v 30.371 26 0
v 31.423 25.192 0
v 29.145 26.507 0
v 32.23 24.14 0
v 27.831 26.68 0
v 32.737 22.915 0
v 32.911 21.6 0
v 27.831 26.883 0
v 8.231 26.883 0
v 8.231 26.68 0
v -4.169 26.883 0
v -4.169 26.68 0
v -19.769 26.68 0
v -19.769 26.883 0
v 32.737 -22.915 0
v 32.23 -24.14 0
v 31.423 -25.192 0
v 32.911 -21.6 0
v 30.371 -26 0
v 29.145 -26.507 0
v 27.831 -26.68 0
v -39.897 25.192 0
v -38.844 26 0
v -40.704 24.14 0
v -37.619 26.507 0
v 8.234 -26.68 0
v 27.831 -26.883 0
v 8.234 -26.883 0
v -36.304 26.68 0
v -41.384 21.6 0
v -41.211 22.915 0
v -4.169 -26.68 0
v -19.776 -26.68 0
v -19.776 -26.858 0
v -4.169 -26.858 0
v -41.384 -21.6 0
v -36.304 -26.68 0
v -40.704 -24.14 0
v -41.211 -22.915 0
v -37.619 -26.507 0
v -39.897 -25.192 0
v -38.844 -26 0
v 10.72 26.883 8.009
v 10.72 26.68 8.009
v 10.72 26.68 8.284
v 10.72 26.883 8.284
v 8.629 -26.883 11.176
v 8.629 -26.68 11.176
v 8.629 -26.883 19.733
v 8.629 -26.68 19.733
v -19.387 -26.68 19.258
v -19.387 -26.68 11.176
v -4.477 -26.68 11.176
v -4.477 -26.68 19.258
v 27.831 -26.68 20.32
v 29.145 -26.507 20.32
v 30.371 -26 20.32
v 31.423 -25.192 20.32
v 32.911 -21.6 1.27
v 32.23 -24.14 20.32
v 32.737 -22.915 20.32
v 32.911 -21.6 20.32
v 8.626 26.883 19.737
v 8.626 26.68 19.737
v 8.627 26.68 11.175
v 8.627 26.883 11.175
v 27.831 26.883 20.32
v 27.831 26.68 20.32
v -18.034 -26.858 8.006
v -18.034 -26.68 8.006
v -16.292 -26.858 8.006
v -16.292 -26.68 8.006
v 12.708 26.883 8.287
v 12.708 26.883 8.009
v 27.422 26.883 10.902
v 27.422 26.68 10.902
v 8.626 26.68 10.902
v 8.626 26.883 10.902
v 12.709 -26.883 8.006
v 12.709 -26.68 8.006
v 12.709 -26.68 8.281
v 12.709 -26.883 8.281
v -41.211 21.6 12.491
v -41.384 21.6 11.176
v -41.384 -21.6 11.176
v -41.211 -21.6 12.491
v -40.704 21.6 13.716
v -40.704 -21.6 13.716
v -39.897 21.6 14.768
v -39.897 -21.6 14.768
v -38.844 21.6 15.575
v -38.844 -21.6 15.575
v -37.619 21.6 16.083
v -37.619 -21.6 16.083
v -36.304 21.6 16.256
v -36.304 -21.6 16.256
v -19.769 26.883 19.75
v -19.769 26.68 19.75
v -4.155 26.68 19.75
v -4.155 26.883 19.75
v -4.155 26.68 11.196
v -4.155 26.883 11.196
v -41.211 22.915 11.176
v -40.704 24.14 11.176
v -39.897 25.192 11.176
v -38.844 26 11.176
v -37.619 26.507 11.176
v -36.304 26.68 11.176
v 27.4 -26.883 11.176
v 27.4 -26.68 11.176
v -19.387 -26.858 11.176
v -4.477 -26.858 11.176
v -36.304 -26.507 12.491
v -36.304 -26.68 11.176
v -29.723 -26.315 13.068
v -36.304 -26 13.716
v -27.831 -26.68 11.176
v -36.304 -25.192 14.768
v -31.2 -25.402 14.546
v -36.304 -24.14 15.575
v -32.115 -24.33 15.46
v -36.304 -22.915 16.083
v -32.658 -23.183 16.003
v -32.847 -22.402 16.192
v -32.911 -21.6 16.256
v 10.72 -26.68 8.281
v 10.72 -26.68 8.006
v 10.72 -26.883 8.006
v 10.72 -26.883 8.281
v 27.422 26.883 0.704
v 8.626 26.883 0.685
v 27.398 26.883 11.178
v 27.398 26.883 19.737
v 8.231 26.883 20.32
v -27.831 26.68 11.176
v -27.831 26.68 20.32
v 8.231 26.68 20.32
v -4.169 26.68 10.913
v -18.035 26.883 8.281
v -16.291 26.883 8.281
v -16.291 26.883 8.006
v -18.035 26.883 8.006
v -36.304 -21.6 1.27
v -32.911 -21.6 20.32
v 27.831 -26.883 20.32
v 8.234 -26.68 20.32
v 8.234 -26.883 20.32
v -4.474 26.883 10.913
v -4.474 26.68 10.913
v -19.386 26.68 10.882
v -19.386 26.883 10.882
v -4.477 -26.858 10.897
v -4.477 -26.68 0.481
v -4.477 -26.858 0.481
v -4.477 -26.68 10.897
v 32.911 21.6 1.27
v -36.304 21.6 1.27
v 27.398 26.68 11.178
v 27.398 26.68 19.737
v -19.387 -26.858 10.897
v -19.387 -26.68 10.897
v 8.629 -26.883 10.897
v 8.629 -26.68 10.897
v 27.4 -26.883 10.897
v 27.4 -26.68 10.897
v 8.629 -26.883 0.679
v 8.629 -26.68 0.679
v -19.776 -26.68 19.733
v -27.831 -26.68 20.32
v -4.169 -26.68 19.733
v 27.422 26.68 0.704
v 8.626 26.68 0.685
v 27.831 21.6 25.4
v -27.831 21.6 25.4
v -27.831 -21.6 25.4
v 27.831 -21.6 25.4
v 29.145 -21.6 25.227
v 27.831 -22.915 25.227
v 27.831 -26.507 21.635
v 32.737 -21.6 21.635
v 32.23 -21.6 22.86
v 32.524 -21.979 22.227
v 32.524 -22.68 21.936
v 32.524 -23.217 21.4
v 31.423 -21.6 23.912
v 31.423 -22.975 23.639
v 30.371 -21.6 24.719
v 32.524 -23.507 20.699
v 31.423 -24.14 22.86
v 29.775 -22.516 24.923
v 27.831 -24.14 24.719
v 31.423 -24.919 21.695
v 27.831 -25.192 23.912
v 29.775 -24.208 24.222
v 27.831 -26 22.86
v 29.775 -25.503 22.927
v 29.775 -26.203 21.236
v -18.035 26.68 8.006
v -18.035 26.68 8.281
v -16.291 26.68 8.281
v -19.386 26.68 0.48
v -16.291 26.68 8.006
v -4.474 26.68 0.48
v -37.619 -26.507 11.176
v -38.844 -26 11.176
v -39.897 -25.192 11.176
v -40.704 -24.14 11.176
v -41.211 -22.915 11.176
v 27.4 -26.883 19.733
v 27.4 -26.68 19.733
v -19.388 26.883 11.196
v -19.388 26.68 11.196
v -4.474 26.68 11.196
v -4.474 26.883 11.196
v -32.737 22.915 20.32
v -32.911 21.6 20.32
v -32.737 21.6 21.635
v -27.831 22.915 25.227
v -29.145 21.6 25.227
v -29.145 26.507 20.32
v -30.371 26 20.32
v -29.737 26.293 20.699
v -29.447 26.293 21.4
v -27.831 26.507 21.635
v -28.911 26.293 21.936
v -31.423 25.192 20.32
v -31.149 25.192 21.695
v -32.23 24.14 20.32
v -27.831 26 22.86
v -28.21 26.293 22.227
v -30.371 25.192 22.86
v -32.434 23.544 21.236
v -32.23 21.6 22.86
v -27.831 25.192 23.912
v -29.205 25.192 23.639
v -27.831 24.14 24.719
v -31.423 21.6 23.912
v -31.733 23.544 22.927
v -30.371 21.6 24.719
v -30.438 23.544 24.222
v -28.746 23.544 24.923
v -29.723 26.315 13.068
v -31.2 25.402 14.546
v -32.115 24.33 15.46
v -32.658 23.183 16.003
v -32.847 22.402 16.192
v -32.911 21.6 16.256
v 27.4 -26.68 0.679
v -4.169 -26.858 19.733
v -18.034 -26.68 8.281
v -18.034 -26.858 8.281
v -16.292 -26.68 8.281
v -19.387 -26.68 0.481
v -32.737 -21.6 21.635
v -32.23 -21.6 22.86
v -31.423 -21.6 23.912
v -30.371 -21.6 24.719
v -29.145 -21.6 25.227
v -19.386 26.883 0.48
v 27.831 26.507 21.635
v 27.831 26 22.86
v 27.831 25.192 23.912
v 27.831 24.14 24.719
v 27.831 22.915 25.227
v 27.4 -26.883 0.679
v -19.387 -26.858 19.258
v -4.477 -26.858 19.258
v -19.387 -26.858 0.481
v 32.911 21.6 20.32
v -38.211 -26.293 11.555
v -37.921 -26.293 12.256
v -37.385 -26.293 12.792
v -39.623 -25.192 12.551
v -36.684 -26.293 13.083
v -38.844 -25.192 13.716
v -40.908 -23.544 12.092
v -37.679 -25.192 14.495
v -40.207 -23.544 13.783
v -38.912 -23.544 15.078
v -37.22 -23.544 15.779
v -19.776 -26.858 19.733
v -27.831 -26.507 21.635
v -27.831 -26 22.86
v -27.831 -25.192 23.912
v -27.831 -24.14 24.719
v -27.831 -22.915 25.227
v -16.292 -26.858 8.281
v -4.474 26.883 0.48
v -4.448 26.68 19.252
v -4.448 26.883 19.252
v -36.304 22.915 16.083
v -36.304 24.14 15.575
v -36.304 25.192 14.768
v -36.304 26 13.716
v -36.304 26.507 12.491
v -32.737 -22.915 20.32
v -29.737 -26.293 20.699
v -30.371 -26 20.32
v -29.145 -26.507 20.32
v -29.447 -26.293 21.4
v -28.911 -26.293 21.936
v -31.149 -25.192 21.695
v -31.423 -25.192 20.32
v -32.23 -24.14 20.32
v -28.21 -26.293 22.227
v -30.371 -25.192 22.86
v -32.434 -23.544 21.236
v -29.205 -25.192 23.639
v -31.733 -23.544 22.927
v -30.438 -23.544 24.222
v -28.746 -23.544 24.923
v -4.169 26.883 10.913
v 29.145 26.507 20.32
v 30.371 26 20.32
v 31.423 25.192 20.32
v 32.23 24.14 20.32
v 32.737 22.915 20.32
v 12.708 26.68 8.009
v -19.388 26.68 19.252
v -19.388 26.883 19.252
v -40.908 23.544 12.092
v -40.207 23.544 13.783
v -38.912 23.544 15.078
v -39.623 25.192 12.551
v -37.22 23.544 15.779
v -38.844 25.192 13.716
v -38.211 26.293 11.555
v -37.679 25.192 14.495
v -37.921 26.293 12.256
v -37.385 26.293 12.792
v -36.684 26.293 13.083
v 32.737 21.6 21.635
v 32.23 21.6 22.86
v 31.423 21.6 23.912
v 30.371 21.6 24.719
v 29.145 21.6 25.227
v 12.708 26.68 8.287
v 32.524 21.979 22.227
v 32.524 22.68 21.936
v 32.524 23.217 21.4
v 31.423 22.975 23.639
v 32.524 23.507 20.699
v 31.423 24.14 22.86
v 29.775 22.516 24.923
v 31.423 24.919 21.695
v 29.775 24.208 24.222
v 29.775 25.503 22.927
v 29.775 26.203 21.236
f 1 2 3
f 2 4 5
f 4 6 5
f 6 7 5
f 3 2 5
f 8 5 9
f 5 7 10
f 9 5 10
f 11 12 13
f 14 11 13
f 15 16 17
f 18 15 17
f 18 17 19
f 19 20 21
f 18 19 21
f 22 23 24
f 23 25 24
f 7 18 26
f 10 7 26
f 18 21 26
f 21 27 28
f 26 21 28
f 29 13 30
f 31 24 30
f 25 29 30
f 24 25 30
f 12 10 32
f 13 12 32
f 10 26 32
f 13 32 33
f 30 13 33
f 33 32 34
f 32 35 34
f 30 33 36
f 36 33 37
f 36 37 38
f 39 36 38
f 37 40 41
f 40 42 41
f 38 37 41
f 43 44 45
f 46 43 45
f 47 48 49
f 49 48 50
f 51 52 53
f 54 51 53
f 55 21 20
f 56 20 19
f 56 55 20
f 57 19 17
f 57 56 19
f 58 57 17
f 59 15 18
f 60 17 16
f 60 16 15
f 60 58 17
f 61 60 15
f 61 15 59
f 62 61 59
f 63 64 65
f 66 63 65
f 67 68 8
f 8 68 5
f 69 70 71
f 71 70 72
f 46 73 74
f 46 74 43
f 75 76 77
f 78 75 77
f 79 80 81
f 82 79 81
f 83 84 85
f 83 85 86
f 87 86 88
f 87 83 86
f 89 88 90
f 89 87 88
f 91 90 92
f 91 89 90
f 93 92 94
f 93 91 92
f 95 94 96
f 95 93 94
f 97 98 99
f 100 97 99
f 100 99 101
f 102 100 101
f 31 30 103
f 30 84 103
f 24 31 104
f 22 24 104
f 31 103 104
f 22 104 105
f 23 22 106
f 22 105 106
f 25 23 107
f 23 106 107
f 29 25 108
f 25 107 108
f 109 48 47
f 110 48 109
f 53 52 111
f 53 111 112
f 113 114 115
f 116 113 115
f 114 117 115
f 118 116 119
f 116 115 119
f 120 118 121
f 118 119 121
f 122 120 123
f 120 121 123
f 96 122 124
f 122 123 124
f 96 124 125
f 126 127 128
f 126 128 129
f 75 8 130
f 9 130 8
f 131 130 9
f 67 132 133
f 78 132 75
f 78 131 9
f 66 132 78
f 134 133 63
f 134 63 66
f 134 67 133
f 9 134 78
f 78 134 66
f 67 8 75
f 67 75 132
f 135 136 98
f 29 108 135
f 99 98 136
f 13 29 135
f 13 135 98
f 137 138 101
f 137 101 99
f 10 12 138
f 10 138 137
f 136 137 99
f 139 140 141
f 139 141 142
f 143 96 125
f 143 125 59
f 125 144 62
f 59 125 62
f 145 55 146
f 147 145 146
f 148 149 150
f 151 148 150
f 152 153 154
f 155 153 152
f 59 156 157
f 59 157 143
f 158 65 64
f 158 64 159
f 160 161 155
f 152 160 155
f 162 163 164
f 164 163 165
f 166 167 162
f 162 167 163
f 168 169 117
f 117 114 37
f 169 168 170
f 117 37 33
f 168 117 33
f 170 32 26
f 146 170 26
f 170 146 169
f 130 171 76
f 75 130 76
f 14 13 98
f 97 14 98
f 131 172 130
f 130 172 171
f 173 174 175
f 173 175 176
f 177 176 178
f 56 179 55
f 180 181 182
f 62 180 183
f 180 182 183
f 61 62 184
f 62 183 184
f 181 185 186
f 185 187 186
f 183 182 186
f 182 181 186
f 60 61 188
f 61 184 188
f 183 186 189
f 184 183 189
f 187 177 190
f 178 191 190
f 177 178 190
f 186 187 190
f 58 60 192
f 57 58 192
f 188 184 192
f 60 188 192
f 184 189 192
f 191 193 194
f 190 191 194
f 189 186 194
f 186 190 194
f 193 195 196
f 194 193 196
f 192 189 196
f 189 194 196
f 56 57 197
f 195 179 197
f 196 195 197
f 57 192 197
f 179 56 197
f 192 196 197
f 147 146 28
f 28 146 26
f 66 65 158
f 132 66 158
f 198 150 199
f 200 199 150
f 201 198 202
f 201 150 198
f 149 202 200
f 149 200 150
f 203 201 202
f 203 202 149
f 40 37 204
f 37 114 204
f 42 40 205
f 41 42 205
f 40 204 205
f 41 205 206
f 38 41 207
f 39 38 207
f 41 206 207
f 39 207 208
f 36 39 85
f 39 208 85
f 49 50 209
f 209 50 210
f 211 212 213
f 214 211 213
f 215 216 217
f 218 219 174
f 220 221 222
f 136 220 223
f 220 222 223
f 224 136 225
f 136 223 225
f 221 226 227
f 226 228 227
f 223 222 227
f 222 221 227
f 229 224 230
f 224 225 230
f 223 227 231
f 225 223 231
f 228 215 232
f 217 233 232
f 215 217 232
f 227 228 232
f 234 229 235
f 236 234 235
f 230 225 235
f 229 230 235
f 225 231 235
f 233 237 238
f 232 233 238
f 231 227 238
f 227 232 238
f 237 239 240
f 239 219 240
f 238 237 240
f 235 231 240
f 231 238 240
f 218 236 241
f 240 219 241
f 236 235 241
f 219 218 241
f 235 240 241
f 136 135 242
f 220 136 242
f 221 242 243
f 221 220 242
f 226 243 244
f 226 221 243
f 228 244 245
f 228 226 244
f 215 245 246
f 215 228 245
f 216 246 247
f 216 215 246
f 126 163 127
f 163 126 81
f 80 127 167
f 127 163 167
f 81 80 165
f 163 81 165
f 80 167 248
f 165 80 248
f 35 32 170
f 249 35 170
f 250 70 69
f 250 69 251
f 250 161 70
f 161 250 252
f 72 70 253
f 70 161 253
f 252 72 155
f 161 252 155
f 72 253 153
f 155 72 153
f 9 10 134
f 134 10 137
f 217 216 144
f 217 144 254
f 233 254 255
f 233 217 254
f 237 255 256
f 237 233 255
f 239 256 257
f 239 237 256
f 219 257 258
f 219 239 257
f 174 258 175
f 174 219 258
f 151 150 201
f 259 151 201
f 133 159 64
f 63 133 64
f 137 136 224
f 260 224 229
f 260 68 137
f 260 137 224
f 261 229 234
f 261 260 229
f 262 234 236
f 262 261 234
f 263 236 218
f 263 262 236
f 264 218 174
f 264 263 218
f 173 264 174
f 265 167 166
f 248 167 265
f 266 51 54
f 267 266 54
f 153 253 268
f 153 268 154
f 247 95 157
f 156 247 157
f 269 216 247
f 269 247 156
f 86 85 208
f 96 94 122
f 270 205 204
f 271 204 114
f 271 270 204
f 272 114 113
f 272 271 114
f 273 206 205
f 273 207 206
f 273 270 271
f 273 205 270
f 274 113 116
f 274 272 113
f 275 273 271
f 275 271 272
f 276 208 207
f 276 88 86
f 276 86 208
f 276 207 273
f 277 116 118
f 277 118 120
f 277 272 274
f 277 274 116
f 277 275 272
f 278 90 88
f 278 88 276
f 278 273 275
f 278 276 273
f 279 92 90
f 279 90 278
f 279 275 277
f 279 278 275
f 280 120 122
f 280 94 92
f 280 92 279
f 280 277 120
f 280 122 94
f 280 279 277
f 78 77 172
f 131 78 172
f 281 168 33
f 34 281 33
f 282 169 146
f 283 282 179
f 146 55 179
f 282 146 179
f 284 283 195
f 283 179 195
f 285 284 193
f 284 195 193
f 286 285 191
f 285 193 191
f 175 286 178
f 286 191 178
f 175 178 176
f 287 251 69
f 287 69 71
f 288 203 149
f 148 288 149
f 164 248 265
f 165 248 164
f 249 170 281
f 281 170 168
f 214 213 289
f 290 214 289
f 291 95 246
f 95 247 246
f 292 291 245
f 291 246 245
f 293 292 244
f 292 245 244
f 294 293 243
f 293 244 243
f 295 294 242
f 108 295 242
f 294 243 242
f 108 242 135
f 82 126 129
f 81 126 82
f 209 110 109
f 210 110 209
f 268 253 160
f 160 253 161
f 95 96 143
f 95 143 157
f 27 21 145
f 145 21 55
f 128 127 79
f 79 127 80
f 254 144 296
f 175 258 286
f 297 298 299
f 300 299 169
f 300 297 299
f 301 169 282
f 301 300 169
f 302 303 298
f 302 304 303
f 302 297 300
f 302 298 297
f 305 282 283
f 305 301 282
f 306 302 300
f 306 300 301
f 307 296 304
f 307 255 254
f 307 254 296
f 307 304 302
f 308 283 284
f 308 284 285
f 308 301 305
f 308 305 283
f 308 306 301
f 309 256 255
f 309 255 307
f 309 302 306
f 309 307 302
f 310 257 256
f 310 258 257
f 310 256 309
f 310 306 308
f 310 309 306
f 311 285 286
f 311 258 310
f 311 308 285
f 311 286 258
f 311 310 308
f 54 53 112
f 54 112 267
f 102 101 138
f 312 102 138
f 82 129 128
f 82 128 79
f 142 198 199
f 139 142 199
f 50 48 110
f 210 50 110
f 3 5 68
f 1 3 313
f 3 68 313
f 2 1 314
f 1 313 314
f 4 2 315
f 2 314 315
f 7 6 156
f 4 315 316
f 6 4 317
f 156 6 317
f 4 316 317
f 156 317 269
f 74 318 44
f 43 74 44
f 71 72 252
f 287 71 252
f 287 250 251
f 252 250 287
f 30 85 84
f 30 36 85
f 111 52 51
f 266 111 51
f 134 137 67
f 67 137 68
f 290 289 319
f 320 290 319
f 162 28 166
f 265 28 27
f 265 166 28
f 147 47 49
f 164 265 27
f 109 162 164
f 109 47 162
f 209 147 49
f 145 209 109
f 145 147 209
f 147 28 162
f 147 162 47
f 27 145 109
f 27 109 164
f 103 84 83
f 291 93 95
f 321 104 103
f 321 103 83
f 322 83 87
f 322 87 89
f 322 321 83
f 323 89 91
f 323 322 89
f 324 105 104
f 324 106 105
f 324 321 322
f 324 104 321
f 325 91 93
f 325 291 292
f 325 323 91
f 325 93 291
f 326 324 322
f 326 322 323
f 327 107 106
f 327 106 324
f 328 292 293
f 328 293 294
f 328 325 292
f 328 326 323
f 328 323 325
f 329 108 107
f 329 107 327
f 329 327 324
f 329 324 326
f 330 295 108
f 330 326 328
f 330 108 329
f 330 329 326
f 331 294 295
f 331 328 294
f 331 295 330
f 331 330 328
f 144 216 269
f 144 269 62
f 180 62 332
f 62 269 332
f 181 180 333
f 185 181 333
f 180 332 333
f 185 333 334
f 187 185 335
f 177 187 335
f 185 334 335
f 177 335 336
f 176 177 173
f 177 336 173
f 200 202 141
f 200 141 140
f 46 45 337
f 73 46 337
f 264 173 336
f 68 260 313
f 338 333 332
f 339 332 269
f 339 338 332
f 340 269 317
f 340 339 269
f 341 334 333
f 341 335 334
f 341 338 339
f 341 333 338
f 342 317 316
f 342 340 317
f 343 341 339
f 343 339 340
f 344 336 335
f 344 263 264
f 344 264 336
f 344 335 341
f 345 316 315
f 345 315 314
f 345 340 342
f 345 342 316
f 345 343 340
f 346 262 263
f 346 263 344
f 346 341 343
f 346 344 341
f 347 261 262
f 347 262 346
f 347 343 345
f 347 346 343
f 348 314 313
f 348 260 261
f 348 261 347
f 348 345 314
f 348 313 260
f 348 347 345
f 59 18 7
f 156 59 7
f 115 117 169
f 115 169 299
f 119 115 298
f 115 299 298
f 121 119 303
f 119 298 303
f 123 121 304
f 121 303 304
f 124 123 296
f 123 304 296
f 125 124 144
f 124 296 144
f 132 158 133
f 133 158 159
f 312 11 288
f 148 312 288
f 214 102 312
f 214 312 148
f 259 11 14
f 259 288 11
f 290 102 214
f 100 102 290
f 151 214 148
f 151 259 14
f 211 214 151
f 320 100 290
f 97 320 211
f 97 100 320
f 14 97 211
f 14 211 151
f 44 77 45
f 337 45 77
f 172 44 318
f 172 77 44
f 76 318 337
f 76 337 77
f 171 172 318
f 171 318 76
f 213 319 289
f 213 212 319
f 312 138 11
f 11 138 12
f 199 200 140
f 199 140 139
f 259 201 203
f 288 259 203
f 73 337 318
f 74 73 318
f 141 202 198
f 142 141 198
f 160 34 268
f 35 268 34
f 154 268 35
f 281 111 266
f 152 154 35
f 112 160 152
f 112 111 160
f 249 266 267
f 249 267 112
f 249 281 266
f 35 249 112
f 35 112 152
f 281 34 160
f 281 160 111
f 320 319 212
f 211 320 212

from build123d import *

# Parameters (mm, degrees)
F0_W      = 65.8210366964
F0_H      = 53.360377121
F1_DEPTH  = 25.4
F0_W_2    = 8.4739662707
F2_DEPTH  = 16.256
F3_R      = 5.08
F4_R      = 5.08
F6_W      = 14.9103230797
F6_H      = 10.4163230571
F6_H_2    = 8.0820930889
F6_W_2    = 1.7418600619
F6_H_3    = 0.2754591405
F8_DEPTH  = 0.1778
F6_W_3    = 18.7708195299
F6_H_4    = 10.2186049917
F6_H_5    = 8.557209163
F6_W_4    = 1.9885748625
F9_DEPTH  = 0.2032
F10_W     = 1.7440356314
F10_H     = 0.2743424848
F11_DEPTH = 0.2032
F7_W      = 43.200377121
F7_H      = 4.064
F12_DEPTH = 66.04
F13_DEPTH = 14.986


# Not quite as in the source:
# - two fillets or chamfers of one size are made in one step


with BuildPart() as f1:
    # F0 (on Top) → F1 (new body)
    with BuildSketch(Plane.XY):
        Rectangle(F0_W, F0_H)
    extrude(amount=F1_DEPTH)

    # F0 (on Top) → F2 (join)
    with BuildSketch(Plane.XY):
        with Locations((-37.1475014836, 0)):
            Rectangle(F0_W_2, F0_H)
    extrude(amount=F2_DEPTH)

    # F3
    f3_edges = [f1.edges().sort_by_distance(p)[0] for p in [
        (-32.910518, 0, 25.4),
        (-41.384485, 0, 16.256),
    ]]
    fillet(f3_edges, radius=F3_R)

    # F4
    f4_edges = [f1.edges().sort_by_distance(p)[0] for p in [
        (2.54, -26.680189, 25.4),
        (2.54, 26.680189, 25.4),
        (32.910518, 0, 25.4),
        (-39.896587, -26.680189, 14.768102),
        (-39.896587, 26.680189, 14.768102),
        (-32.910518, -26.680189, 18.288),
        (-32.910518, 26.680189, 18.288),
        (-31.422621, -26.680189, 23.912102),
        (-34.607501, -26.680189, 16.256),
        (32.910518, -26.680189, 12.7),
        (-41.384485, -26.680189, 5.588),
        (-31.422621, 26.680189, 23.912102),
        (-34.607501, 26.680189, 16.256),
        (32.910518, 26.680189, 12.7),
        (-41.384485, 26.680189, 5.588),
    ]]
    fillet(f4_edges, radius=F4_R)

    # F6 (on face) → F8 (join)
    with BuildSketch(Plane.XZ.offset(26.6801885605)):
        Polygon((-19.7755768895, 0), (-4.168510437, 0), (-4.168510437, 11.176), (-4.168510437, 19.733209163), (-19.7755768895, 19.733209163), (-19.7755768895, 11.176), align=None)
        with Locations((-11.9322177488, 5.6890027045)):
            Rectangle(F6_W, F6_H, mode=Mode.SUBTRACT)
        with Locations((-11.9322177488, 15.2170465444)):
            Rectangle(F6_W, F6_H_2, mode=Mode.SUBTRACT)
        with Locations((-17.1627867967, 8.1434063613)):
            Rectangle(F6_W_2, F6_H_3)
    extrude(amount=F8_DEPTH)

    # F6 (on face) → F9 (join)
    with BuildSketch(Plane.XZ.offset(26.6801885605)):
        Polygon((8.2342270762, 20.32), (8.2342270762, 11.176), (8.2342270762, 0), (27.8305183482, 0), (27.8305183482, 11.176), (27.8305183482, 19.733209163), (27.8305183482, 20.32), align=None)
        with Locations((18.0146349594, 5.7878617372)):
            Rectangle(F6_W_3, F6_H_4, mode=Mode.SUBTRACT)
        with Locations((18.0146349594, 15.4546045815)):
            Rectangle(F6_W_3, F6_H_5, mode=Mode.SUBTRACT)
        with Locations((11.7142330855, 8.1434063613)):
            Rectangle(F6_W_4, F6_H_3)
    extrude(amount=F9_DEPTH)

    # F10 (on face) → F11 (join)
    with BuildSketch(Plane(origin=(0, 26.6801885605, 0), x_dir=(-1, 0, 0), z_dir=(0, 1, 0))):
        Polygon((-27.8305183482, 0), (-8.2305837423, 0), (-8.2305837423, 10.9018748626), (-8.2305837423, 20.32), (-27.8305183482, 20.32), (-27.8305183482, 11.2858796492), (-27.8305183482, 10.9018748626), align=None)
        Polygon((-8.626322262, 0.6852262607), (-27.4223405868, 0.7035561139), (-27.4223405868, 10.9018748626), (-8.626322262, 10.9018748626), align=None, mode=Mode.SUBTRACT)
        Polygon((-27.3978635669, 11.1784273759), (-27.3978635669, 19.7369996458), (-8.626322262, 19.7369996458), (-8.6272079498, 11.1749703065), align=None, mode=Mode.SUBTRACT)
        Polygon((-10.7196969911, 8.2838209346), (-12.7080604434, 8.287482895), (-12.7080604434, 8.0091850832), (-10.7196969911, 8.0091850832), align=None)
        Polygon((4.1694319807, 10.9128411859), (4.1694319807, 0), (19.7687353939, 0), (19.7687353939, 10.9128411859), (19.7687353939, 11.1958524212), (19.7687353939, 19.7498388588), (4.1547794826, 19.7498388588), (4.1547794826, 11.1958505586), align=None)
        Polygon((4.4739199802, 0.4796771973), (4.4739199802, 10.9128411859), (19.3859692663, 10.8820935711), (19.3859692663, 0.4796771973), align=None, mode=Mode.SUBTRACT)
        Polygon((19.3879064173, 19.2518327385), (19.3879064173, 11.1958524212), (4.4739199802, 11.1958505586), (4.4477242045, 19.2518327385), align=None, mode=Mode.SUBTRACT)
        with Locations((17.162848264, 8.1434589811)):
            Rectangle(F10_W, F10_H)
    extrude(amount=F11_DEPTH)

    # F7 (on face) → F12 (cut)
    with BuildSketch(Plane(origin=(-32.9105183482, 0, 0), x_dir=(0, -1, 0), z_dir=(-1, 0, 0))):
        with Locations((0, 18.288)):
            Rectangle(F7_W, F7_H)
    extrude(amount=-F12_DEPTH, mode=Mode.SUBTRACT)

    # F13 (cut): a face of the model
    f13_faces = [f1.faces().sort_by_distance(p)[0] for p in [
        (-1.6969831353, 0, 16.256),
    ]]
    extrude(f13_faces, amount=-F13_DEPTH, mode=Mode.SUBTRACT)


solid = f1.part
